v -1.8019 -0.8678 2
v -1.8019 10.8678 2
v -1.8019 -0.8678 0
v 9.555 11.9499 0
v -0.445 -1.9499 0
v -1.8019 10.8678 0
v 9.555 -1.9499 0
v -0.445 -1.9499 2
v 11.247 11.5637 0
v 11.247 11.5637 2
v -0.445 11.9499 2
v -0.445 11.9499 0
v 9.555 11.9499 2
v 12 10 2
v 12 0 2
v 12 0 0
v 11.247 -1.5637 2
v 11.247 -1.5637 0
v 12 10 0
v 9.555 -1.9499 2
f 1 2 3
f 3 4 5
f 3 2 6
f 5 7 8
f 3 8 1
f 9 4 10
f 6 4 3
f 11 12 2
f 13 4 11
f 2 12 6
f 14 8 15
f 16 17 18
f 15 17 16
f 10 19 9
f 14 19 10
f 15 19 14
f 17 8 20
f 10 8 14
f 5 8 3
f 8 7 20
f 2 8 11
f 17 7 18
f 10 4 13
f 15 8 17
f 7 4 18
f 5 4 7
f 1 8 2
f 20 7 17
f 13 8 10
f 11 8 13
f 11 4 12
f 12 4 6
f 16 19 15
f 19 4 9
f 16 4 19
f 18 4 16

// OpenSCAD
// Unit of length: Unit.MM
minkowski(convexity = 10)
{
   cube(size = [10.0, 10.0, 1.0], center = false);
   cylinder(h = 1.0, d = 4.0, center = false);
}
